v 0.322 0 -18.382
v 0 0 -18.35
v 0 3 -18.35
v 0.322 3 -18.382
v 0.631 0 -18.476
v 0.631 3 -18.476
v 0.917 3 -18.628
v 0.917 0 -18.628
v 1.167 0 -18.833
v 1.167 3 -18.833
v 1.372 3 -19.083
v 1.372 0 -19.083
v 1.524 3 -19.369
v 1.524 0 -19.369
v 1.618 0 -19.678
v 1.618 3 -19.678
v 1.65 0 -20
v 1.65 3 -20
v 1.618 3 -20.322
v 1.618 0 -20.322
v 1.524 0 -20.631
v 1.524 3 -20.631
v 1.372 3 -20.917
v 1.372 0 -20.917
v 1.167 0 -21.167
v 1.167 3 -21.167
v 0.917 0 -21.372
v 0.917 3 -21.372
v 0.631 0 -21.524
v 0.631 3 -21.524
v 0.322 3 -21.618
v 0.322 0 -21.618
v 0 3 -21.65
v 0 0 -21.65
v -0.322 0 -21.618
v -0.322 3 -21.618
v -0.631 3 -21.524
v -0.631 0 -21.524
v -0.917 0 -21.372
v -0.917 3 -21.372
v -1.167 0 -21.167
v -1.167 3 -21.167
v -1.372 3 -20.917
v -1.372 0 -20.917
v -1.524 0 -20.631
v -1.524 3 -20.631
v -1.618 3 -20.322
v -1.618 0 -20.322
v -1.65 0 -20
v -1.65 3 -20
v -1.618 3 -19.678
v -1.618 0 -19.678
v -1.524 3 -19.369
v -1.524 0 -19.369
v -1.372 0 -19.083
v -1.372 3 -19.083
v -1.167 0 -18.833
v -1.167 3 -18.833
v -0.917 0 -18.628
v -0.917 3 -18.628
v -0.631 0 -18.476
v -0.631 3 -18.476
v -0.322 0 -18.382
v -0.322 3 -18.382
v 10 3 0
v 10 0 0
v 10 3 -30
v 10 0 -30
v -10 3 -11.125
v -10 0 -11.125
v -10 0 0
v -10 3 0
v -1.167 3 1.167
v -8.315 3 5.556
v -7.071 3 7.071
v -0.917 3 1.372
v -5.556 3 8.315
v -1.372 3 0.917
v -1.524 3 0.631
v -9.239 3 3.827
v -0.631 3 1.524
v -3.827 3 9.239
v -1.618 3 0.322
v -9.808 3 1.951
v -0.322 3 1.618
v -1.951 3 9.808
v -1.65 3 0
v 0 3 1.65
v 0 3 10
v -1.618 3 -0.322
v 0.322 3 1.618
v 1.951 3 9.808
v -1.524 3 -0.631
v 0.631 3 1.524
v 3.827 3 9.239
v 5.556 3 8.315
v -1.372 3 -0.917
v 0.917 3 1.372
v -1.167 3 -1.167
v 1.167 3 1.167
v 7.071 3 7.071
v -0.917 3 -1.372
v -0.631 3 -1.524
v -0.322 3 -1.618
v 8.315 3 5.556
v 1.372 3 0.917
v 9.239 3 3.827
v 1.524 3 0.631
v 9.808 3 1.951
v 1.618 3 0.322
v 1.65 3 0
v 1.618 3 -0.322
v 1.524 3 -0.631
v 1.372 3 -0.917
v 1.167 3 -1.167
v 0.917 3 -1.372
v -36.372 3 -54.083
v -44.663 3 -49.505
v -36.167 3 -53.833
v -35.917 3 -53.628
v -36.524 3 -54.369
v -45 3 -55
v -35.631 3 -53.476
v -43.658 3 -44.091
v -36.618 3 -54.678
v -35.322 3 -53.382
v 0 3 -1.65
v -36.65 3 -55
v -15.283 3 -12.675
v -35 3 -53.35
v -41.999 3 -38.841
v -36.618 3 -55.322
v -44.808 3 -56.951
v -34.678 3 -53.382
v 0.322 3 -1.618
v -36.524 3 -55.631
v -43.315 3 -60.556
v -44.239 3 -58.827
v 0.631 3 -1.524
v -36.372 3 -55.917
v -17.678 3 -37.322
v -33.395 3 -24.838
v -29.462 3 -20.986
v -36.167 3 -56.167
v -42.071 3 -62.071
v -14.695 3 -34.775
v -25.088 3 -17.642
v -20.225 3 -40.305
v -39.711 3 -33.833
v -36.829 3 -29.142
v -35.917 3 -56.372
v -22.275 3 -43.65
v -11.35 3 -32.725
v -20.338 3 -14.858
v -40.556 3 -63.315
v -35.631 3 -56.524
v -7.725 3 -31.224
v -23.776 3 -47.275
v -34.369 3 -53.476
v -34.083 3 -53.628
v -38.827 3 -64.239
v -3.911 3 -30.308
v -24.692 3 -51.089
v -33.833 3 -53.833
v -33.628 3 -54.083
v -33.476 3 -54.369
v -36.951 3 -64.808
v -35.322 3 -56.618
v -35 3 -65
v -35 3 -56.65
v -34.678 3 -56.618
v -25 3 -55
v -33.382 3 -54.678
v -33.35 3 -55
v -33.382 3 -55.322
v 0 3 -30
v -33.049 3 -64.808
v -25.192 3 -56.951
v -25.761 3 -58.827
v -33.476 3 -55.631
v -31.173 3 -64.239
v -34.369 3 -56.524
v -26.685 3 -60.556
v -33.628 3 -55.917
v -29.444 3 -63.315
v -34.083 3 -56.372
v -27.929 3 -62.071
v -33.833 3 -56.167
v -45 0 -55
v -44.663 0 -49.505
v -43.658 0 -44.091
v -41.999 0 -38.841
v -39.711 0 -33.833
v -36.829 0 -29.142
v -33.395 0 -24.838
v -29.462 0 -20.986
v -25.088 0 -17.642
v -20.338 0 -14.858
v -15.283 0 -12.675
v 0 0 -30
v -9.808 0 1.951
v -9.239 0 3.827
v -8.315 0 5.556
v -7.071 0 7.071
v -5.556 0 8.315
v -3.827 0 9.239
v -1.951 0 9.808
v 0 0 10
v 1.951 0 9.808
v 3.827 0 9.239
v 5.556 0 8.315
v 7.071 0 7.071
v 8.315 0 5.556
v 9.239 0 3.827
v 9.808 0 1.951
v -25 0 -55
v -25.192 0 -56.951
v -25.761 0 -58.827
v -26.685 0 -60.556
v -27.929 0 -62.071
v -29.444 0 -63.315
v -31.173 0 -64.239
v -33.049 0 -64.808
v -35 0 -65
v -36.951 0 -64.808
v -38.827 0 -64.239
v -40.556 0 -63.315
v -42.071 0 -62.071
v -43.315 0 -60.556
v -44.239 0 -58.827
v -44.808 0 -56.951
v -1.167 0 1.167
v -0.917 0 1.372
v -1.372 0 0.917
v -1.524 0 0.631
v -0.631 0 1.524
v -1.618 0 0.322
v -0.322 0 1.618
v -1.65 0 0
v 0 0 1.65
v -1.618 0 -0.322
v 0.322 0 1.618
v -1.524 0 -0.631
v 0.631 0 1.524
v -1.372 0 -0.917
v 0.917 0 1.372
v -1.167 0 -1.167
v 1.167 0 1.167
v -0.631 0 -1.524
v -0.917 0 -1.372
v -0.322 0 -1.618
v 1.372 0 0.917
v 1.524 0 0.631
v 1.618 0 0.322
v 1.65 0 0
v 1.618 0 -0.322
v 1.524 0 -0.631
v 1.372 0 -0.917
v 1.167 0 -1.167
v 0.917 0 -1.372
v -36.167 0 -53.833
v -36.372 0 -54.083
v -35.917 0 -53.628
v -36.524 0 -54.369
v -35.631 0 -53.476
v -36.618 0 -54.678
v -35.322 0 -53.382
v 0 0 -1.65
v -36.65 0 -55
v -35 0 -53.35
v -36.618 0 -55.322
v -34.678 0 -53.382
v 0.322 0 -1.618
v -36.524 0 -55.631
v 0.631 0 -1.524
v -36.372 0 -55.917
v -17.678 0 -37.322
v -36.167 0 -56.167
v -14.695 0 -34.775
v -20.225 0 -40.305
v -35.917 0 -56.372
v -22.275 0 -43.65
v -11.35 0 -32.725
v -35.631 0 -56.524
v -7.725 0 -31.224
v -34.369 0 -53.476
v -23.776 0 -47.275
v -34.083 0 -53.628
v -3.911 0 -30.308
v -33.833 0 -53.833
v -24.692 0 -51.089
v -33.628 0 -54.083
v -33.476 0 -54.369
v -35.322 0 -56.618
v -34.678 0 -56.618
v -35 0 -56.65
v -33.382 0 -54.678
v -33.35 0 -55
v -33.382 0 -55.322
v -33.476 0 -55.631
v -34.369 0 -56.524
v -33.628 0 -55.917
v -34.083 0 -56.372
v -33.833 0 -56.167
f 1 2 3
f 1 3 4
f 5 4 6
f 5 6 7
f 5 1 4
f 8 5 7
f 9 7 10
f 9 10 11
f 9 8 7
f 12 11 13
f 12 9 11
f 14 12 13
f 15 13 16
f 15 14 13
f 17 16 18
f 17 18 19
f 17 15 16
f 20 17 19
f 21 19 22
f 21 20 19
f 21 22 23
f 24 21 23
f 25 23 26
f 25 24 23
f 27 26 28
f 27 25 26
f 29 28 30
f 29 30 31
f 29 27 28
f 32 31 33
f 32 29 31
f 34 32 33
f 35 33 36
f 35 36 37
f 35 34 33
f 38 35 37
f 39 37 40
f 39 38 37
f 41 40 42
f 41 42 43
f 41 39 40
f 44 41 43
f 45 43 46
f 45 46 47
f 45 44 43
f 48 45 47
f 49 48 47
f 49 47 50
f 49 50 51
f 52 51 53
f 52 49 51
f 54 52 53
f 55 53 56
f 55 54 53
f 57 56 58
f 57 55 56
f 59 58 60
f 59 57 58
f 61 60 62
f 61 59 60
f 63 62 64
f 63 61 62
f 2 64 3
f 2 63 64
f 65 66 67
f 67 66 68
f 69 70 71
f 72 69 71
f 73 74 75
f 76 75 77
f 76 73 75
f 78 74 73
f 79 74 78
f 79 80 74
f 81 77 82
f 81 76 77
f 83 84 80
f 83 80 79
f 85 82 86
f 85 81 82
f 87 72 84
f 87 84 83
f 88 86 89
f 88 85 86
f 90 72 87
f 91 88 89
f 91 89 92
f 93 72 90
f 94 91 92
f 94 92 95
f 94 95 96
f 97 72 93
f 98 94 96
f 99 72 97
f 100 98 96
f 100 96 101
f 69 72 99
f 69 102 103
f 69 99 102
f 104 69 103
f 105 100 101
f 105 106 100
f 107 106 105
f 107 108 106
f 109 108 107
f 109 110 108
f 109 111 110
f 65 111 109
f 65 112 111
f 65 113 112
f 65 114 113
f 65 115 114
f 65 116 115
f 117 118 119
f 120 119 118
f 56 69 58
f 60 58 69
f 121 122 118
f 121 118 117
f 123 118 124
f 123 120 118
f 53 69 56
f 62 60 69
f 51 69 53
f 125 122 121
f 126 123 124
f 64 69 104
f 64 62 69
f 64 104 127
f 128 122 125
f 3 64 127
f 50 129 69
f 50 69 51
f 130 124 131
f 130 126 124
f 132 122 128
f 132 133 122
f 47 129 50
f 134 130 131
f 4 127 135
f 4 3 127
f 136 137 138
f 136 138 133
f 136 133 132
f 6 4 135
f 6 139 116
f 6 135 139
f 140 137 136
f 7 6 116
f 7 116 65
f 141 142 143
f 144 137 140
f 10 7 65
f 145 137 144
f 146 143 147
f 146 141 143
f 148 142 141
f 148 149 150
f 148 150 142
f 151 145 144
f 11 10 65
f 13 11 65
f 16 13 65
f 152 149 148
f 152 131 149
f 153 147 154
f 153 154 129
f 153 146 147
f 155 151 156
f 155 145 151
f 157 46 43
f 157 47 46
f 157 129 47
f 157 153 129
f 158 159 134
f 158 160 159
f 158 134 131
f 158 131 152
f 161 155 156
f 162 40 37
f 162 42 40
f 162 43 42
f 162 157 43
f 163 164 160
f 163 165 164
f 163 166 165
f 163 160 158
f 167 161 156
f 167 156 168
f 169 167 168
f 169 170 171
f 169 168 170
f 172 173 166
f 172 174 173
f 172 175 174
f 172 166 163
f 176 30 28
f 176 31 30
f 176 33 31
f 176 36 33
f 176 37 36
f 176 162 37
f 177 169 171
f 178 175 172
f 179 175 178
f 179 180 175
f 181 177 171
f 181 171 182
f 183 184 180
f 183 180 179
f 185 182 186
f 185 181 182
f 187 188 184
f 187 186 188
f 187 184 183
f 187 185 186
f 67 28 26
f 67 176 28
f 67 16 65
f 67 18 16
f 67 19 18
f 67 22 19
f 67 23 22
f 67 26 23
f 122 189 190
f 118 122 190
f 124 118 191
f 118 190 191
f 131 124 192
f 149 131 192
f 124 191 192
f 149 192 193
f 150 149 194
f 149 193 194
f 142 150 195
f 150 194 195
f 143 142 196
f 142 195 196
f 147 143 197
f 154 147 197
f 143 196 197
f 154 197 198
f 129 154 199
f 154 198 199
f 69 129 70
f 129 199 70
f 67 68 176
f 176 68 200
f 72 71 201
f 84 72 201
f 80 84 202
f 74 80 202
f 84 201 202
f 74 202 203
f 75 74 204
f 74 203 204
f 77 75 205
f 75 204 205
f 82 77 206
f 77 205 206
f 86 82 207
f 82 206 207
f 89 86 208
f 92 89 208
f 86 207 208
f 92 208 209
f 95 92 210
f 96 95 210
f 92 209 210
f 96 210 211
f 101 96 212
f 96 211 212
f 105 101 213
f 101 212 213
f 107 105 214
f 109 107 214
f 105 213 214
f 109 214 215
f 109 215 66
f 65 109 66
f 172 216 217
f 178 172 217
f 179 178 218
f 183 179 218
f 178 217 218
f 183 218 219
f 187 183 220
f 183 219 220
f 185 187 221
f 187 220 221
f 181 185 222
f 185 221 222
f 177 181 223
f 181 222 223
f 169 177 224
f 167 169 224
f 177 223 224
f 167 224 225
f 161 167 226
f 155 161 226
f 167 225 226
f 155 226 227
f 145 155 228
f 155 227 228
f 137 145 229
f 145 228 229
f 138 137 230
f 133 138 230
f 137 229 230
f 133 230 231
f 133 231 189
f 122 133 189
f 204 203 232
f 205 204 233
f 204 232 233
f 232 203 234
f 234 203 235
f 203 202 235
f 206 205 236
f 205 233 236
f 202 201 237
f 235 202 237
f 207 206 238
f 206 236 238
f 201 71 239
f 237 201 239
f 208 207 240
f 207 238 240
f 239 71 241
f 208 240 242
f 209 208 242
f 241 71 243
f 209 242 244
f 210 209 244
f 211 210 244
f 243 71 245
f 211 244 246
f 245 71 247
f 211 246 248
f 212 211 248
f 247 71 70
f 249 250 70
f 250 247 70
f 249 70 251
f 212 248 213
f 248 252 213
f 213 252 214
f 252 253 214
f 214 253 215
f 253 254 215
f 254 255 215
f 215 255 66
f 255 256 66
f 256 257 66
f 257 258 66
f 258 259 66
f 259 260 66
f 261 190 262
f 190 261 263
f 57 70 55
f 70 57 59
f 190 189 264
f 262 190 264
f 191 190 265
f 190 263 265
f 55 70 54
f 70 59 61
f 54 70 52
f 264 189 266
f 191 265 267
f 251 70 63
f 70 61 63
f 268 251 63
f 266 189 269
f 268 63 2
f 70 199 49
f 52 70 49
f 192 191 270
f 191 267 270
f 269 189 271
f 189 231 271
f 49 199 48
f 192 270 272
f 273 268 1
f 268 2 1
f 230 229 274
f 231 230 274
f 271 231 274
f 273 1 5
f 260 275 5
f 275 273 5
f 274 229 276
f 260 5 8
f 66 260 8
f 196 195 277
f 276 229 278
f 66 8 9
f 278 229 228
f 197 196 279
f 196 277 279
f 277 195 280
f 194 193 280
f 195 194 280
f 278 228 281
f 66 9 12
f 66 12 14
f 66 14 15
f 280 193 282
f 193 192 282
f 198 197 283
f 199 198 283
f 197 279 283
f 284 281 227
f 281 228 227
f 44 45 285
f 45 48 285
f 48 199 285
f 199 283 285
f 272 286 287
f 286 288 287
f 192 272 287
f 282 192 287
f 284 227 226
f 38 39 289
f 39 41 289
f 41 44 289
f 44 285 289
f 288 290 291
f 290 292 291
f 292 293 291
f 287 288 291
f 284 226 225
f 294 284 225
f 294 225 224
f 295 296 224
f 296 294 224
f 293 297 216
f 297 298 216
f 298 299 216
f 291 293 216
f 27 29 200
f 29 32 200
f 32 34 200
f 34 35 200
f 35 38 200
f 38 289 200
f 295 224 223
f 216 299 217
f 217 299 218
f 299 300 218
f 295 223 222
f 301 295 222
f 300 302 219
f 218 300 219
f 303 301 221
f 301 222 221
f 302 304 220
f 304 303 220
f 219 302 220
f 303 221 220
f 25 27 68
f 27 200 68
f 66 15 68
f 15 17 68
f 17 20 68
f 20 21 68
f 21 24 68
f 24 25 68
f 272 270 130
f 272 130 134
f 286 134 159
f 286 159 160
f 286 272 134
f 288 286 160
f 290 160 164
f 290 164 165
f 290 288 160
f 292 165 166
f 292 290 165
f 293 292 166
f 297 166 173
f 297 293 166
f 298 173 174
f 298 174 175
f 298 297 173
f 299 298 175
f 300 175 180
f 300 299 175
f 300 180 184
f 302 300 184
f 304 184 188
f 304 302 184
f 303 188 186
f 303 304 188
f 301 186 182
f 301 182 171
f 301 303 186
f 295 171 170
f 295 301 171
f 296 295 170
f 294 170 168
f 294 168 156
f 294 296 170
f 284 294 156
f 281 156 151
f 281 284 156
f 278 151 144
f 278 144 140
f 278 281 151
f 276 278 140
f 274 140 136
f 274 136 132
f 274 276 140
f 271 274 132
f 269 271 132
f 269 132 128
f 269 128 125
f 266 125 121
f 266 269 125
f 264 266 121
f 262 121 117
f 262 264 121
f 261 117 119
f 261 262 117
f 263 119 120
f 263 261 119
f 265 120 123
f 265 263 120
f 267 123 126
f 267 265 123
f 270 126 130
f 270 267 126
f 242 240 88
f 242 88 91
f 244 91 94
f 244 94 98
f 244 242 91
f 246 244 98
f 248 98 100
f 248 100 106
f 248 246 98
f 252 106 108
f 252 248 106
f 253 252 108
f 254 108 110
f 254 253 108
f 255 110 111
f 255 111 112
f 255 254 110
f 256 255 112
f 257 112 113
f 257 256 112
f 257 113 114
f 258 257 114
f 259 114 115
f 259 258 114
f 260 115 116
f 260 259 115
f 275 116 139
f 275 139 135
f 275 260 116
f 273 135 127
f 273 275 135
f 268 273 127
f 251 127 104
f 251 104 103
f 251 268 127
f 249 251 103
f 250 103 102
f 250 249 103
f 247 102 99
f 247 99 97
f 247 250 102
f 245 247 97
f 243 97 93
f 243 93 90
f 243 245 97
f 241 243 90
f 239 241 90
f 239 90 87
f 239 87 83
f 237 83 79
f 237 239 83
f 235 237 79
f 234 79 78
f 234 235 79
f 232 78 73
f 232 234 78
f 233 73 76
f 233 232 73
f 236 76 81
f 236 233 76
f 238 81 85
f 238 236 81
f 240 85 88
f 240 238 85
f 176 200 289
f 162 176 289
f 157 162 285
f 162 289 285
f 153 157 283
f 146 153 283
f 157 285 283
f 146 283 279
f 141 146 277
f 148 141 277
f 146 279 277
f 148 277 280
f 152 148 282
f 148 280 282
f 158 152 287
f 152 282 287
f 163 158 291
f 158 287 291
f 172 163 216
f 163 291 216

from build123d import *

# Parameters (mm, degrees)
SKETCH_1_R      = 1.65
EXTRUDE_1_DEPTH = 3


with BuildPart() as part:
    # 草图1 → 凸台-拉伸1 (new body)
    with BuildSketch(Plane(origin=(0, 0, 0), x_dir=(1, 0, 0), z_dir=(0, 1, 0))):
        with BuildLine():
            Line((10, 0), (10, 30))
            Line((10, 30), (0, 30))
            ThreePointArc((0, 30), (-17.67766953, 37.32233047), (-25, 55))
            ThreePointArc((-25, 55), (-35, 65), (-45, 55))
            ThreePointArc((-45, 55), (-35.178118199, 26.937569599), (-10, 11.125178063))
            Line((-10, 11.125178063), (-10, 0))
            ThreePointArc((-10, 0), (0, -10), (10, 0))
        make_face()
        with Locations(Location((-35, 55, 0), (0, 0, 270))):
            Circle(SKETCH_1_R, mode=Mode.SUBTRACT)
        with Locations(Location((0, 20, 0), (0, 0, 270))):
            Circle(SKETCH_1_R, mode=Mode.SUBTRACT)
        with Locations(Location((0, 0, 0), (0, 0, 270))):
            Circle(SKETCH_1_R, mode=Mode.SUBTRACT)
    extrude(amount=EXTRUDE_1_DEPTH)


solid = part.part
